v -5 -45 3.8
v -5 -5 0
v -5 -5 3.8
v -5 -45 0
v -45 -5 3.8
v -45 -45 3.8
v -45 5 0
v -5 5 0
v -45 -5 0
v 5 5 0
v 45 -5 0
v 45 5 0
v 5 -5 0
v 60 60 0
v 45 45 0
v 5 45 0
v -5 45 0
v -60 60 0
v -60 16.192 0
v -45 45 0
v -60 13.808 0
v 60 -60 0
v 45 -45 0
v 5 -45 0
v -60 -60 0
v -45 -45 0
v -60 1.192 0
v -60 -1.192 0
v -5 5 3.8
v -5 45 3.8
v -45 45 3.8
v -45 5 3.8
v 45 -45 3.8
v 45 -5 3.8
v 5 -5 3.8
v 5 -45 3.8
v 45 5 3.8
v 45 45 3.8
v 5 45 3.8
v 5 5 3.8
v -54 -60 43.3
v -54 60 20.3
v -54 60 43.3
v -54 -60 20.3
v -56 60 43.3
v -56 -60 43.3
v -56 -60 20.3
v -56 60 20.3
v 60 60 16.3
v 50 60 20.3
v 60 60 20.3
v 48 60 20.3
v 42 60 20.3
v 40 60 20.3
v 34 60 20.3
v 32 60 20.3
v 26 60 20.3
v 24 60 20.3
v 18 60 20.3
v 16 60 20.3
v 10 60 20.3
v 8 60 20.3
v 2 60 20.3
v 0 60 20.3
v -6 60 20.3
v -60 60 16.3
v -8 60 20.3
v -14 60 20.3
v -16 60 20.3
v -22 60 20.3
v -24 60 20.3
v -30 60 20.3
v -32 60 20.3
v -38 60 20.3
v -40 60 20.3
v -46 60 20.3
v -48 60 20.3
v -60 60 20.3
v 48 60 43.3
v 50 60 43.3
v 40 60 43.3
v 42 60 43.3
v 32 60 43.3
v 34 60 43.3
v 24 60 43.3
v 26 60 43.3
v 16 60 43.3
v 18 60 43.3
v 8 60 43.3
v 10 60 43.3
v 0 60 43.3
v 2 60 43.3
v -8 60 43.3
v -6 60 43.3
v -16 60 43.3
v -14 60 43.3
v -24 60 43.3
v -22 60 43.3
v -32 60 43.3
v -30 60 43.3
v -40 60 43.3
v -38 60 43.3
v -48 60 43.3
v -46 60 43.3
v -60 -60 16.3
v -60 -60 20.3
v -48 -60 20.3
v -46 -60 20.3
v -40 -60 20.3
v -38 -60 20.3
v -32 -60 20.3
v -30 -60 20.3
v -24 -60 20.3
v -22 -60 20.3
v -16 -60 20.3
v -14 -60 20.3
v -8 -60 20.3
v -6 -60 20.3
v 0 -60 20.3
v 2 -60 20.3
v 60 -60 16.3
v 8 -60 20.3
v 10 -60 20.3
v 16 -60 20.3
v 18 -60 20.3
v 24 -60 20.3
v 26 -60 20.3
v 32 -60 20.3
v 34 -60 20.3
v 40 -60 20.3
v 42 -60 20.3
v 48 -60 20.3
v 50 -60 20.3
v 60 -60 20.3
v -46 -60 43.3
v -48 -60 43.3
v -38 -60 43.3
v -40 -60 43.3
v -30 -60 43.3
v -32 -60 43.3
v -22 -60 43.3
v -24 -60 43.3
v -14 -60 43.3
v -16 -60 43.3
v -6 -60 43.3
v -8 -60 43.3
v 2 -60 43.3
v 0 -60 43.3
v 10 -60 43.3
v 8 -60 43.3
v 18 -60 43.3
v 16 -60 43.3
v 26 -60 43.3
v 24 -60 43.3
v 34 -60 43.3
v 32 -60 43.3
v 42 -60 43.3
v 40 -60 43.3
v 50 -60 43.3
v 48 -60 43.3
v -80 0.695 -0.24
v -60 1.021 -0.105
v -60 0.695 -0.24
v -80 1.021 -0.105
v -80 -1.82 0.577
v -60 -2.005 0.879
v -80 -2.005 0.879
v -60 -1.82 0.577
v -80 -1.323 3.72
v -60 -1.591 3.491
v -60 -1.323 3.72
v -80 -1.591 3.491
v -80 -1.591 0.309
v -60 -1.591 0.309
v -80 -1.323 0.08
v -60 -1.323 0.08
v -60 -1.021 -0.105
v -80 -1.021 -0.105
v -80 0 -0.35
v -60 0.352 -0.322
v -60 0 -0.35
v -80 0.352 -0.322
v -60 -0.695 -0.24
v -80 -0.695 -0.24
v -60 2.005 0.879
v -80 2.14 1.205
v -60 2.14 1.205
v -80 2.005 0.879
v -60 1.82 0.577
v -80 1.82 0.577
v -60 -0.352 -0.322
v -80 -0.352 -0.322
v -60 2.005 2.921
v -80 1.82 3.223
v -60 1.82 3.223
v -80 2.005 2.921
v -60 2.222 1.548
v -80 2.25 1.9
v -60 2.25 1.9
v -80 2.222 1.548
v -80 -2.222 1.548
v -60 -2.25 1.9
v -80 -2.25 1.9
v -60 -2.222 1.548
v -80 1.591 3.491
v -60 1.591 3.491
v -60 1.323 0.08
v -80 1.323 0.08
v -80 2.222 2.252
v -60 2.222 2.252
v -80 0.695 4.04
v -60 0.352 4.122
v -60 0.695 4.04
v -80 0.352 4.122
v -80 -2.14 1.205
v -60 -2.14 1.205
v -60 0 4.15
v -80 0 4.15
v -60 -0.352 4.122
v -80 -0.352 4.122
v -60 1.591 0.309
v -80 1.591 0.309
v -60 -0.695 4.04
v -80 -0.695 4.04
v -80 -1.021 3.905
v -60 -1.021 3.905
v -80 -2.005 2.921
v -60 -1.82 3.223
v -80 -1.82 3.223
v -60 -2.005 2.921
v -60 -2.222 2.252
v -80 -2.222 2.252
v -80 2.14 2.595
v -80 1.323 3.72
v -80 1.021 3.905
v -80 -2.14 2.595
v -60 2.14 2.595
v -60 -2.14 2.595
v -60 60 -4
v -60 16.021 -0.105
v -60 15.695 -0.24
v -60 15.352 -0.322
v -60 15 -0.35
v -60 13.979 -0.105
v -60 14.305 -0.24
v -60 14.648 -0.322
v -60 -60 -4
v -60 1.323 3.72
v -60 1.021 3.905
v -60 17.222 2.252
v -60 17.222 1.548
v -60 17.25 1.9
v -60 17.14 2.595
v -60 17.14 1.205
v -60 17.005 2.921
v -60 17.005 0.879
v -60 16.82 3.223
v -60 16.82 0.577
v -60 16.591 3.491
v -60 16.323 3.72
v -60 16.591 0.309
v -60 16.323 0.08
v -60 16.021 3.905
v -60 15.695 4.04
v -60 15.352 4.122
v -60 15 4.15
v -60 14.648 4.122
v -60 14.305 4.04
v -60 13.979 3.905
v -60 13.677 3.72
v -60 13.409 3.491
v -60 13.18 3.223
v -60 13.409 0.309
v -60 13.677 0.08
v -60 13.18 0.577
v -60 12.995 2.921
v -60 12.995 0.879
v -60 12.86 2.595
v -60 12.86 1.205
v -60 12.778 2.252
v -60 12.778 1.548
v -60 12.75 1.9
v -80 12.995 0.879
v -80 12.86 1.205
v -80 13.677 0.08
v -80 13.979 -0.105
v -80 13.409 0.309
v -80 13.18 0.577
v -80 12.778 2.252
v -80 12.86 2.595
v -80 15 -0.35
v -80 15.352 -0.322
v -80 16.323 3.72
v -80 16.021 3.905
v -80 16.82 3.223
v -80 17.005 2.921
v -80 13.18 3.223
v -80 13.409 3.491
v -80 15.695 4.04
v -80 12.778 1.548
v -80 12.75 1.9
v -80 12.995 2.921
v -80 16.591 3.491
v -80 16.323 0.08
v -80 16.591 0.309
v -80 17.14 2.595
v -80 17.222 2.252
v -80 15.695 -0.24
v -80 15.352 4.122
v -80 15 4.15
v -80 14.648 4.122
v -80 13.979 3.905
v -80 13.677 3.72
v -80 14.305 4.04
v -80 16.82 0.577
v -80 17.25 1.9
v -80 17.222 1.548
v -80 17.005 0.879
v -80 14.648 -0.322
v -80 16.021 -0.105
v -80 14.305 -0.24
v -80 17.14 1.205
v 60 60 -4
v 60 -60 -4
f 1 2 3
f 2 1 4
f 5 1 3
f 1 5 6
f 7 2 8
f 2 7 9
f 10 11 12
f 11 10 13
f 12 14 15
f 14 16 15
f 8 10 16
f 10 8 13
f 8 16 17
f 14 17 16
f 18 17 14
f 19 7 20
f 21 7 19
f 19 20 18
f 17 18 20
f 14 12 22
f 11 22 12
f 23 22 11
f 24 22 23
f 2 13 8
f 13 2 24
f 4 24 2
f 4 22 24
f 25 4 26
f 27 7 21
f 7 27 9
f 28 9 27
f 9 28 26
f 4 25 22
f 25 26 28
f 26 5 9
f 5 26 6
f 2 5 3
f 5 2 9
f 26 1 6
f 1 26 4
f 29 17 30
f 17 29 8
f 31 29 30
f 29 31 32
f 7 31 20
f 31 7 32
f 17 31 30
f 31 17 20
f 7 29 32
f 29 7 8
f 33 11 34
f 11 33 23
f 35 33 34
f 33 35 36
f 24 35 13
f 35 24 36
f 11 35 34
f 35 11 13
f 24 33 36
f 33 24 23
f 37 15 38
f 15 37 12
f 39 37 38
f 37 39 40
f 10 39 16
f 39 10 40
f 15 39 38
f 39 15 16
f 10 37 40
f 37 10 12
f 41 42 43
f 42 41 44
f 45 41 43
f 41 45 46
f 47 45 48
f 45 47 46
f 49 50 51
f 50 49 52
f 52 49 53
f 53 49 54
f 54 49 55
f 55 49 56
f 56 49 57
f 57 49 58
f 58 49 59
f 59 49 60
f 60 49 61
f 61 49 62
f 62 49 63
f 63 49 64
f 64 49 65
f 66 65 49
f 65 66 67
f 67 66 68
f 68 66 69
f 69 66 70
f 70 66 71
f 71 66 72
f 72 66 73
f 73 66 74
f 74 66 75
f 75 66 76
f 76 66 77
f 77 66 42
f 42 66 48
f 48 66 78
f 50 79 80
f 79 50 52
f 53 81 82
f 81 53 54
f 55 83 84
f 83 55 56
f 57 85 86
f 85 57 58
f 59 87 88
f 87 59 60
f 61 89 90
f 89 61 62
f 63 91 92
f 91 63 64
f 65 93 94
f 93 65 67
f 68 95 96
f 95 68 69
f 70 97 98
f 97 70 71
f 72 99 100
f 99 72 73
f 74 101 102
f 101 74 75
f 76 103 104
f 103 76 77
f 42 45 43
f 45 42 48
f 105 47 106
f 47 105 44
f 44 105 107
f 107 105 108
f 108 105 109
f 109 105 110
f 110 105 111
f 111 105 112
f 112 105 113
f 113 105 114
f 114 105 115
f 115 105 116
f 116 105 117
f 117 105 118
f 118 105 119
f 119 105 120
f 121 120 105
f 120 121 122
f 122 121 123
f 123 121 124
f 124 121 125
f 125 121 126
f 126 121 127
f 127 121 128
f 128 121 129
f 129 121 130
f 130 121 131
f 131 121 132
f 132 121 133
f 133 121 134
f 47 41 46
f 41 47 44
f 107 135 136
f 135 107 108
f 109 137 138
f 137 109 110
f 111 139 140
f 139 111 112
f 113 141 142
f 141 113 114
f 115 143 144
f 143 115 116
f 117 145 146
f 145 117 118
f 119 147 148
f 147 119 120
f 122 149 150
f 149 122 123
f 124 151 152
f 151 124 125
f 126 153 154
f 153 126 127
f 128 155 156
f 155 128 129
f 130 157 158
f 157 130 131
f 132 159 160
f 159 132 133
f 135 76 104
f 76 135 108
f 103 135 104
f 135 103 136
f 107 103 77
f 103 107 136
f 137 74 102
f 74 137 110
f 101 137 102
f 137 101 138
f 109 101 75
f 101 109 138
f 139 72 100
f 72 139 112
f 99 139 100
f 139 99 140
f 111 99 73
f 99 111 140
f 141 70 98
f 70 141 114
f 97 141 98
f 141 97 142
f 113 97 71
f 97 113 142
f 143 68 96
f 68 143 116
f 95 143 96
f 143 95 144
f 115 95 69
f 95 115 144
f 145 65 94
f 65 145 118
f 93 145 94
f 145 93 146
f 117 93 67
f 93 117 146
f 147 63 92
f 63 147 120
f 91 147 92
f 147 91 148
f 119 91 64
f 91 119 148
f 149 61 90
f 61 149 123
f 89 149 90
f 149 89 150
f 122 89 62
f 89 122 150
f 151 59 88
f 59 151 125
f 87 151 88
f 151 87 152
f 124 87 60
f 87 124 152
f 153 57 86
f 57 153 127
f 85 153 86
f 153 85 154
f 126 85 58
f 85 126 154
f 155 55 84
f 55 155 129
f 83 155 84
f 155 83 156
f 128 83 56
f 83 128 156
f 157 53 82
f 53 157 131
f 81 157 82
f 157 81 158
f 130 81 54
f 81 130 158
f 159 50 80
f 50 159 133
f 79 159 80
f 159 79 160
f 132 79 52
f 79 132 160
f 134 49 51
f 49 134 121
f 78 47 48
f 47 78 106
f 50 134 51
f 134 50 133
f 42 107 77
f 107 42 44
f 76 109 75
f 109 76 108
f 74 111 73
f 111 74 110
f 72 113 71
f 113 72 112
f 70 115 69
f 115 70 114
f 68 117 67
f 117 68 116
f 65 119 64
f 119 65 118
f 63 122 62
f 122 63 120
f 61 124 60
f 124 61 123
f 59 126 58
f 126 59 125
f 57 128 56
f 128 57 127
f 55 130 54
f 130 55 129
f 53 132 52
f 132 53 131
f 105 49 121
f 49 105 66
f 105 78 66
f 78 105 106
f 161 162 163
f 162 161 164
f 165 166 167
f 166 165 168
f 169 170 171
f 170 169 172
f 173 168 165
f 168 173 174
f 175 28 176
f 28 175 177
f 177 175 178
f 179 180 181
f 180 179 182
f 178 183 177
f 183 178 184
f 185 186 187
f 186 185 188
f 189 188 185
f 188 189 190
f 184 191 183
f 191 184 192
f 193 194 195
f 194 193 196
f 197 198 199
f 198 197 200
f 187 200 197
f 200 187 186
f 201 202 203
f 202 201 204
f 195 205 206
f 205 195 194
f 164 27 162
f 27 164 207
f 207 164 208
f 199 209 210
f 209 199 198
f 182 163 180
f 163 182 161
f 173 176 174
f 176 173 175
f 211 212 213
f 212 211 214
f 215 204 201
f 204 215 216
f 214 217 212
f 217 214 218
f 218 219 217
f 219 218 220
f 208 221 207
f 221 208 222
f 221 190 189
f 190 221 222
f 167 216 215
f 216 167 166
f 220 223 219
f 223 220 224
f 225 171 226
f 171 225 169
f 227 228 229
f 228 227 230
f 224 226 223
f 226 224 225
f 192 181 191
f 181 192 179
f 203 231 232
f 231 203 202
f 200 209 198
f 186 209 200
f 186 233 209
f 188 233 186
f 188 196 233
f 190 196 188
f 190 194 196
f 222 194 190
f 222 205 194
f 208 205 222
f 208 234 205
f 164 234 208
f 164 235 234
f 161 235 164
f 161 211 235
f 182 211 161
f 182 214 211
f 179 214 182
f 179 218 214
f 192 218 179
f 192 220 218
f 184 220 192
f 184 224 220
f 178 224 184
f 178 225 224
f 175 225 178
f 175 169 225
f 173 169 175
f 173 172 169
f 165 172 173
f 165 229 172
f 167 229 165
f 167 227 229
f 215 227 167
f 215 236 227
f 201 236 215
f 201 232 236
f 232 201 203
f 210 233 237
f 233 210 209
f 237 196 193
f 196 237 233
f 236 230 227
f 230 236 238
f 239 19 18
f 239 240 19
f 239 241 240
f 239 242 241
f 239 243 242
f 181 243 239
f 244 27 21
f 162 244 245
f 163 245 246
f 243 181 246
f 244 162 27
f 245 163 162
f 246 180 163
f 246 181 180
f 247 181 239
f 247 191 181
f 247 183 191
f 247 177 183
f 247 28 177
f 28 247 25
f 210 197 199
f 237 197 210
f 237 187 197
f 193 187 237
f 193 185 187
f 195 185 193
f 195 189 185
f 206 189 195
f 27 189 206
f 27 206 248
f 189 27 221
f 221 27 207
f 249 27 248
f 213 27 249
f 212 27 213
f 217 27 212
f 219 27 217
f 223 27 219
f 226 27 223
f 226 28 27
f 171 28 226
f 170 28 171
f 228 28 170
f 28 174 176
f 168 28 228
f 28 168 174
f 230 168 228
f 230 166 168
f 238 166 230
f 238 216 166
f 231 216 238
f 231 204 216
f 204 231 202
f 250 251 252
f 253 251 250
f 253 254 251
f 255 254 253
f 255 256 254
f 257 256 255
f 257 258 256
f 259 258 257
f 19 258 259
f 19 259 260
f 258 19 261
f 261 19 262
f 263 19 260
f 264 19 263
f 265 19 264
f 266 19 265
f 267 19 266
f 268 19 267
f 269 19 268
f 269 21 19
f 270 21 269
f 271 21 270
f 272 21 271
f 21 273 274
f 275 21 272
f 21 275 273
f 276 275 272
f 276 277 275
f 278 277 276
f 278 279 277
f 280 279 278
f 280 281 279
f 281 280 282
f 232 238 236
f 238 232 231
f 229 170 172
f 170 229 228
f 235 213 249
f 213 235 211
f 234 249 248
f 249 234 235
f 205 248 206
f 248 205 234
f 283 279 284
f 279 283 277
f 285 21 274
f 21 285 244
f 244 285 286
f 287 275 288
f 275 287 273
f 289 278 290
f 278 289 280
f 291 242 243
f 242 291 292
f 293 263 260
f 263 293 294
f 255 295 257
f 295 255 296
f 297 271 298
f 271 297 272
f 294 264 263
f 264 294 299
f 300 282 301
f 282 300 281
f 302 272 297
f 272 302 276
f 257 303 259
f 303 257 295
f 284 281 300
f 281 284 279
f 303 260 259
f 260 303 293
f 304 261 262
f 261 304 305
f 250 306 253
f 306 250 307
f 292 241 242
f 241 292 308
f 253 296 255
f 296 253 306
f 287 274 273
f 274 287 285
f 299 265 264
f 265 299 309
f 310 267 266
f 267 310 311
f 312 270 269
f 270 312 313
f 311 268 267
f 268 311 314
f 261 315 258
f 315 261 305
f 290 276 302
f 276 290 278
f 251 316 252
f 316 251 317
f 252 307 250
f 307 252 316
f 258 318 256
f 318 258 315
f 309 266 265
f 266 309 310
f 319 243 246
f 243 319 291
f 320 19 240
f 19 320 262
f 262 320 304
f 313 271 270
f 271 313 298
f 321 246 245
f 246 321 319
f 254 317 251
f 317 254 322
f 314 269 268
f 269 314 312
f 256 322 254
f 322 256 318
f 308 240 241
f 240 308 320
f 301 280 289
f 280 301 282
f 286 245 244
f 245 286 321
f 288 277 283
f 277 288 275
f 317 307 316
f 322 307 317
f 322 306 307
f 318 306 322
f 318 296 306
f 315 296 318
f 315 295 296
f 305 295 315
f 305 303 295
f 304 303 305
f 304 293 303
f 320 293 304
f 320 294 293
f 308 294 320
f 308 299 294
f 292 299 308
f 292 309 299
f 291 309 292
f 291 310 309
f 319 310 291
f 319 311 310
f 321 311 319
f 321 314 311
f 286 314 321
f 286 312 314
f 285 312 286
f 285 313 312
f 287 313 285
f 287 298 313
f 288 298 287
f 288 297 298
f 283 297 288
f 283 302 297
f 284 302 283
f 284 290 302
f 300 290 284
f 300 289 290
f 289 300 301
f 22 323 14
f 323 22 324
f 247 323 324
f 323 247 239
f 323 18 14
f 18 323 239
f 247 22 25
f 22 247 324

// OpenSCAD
// ========================================================
// F-14F RETROFIT KIT - AVIONICS CLIMATE CONTROL MODULE
// SOLID-STATE THERMOELECTRIC PELTIER JUNCTION ASSEMBLY
// ========================================================

$fn = 40; // Precision edge smoothing for cooling fin arrays

// --- THERMOELECTRIC UNIT CONSTANTS (mm) ---
peltier_dim  = 40.0;  // Standard industrial military ruggedized TEC footprint
peltier_h    = 3.8;   // Ceramic core element thickness
fin_height   = 25.0;  // Height of anodized thermal dissipation fins
base_plate_w = 120.0; // Complete multi-array block mounting width
base_plate_l = 120.0;

// --- COLOR PALETTE ---
ceramic_white  = [0.95, 0.95, 0.92, 1.0]; // Alumina (Al2O3) Peltier substrate
anodized_black = [0.18, 0.18, 0.20, 1.0]; // High-emissivity black aluminum heat sink
bismuth_tellur = [0.45, 0.47, 0.48, 1.0]; // Internal Bi2Te3 semiconductor pellets
copper_bus     = [0.85, 0.45, 0.20, 1.0]; // Internal power routing bus lines

// ========================================================
// MECHANICAL MODEL COMPONENT ASSEMBLY
// ========================================================

module peltier_climate_assembly() {
    // 1. The Lower Base Mounting Plate (Interfaces with Vapor Chamber Manifold)
    color(anodized_black)
        translate([0, 0, -2.0])
        cube([base_plate_l, base_plate_w, 4.0], center=true);

    // 2. Quad-Array of Solid-State Peltier Modules (Seated in a 2x2 grid matrix)
    for (x_offset = [-25, 25]) {
        for (y_offset = [-25, 25]) {
            translate([x_offset, y_offset, peltier_h/2]) {
                // Top/Bottom Alumina Ceramic Insulator Plates
                color(ceramic_white) cube([peltier_dim, peltier_dim, peltier_h], center=true);
                
                // Internal Semiconductor Matrix (Visible in cross-section / transparency)
                color(bismuth_tellur) %cube([peltier_dim - 2, peltier_dim - 2, peltier_h - 1], center=true);
            }
        }
    }

    // 3. The Upper Heavy-Duty Dissipation Fin Matrix (Replaces old coils)
    translate([0, 0, peltier_h + fin_height/2 + 2.0]) {
        // Fin assembly base slab
        color(anodized_black) cube([base_plate_l, base_plate_w, 4.0], center=true);
        
        // Programmatic generation of vertical cooling fins to maximize surface area
        color(anodized_black) {
            for (x_fin = [-base_plate_l/2 + 5 : 8 : base_plate_l/2 - 5]) {
                translate([x_fin, 0, fin_height/2])
                    cube([2.0, base_plate_w, fin_height], center=true);
            }
        }
    }
    
    // 4. Heavy-Duty Braided High-Current Silicon Power Feed Leads
    color(copper_bus) {
        translate([-base_plate_l/2 - 10, 0, peltier_h/2])
            rotate([0, 90, 0]) cylinder(d=4.5, h=20, center=true);
        translate([-base_plate_l/2 - 10, 15, peltier_h/2])
            rotate([0, 90, 0]) cylinder(d=4.5, h=20, center=true);
    }
}

// Execute active rendering tree module
peltier_climate_assembly();
